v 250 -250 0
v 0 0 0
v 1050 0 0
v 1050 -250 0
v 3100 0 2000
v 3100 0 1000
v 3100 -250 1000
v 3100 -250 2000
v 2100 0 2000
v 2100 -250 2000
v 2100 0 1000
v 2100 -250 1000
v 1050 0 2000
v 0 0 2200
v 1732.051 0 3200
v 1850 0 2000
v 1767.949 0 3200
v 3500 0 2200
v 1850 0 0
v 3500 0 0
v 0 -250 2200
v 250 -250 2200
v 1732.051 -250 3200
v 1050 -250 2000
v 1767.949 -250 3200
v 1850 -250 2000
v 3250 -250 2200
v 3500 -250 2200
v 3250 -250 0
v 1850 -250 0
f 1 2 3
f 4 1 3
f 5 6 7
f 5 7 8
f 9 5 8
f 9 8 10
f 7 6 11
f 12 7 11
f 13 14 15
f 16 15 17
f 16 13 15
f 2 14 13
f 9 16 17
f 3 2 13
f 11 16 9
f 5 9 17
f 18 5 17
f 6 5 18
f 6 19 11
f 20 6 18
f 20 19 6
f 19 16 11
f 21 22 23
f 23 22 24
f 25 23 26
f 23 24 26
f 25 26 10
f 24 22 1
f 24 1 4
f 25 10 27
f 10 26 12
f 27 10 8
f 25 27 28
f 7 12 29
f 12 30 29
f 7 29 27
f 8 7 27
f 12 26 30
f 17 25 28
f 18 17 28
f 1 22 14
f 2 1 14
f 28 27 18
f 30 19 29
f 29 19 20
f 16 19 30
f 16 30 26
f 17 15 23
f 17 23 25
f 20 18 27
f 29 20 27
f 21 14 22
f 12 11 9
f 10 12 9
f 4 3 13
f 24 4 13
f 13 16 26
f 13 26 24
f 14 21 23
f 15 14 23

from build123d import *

# Parameters (mm, degrees)
F0_W      = 3500
F0_H      = 2200
F1_DEPTH  = 250
F3_DEPTH  = 2200.001
F4_W      = 3500
F4_H      = 250
F5_DEPTH  = 1000
F7_DEPTH  = 250.001
F8_W      = 800
F8_H      = 2000
F9_DEPTH  = 250.001
F10_W     = 1000
F10_H     = 1000
F11_DEPTH = 250.001


with BuildPart() as f1:
    # F0 (on Front) → F1 (new body)
    with BuildSketch(Plane.XZ):
        with Locations((1750, 1100)):
            Rectangle(F0_W, F0_H)
    extrude(amount=F1_DEPTH)

    # F2 (on face) → F3 (cut, through all)
    with BuildSketch(Plane.XY.offset(2200)):
        Polygon((250, -250), (0, 0), (0, -250), align=None)
        Polygon((3250, -250), (3500, -250), (3500, 0), align=None)
    extrude(amount=-F3_DEPTH, mode=Mode.SUBTRACT)

    # F4 (on face) → F5 (join)
    with BuildSketch(Plane.XY.offset(2200)):
        with Locations((1750, -125)):
            Rectangle(F4_W, F4_H)
    extrude(amount=F5_DEPTH)

    # F6 (on face) → F7 (cut, through all)
    with BuildSketch(Plane.XZ.offset(250)):
        Polygon((0, 3200), (0, 2200), (1732.050808, 3200), align=None)
        Polygon((3500, 3200), (1767.949192, 3200), (3500, 2200), align=None)
        Polygon((1750, 3210.362971), (1732.050808, 3200), (1767.949192, 3200), align=None)
    extrude(amount=-F7_DEPTH, mode=Mode.SUBTRACT)

    # F8 (on face) → F9 (cut, through all)
    with BuildSketch(Plane(origin=(0, 0, 0), x_dir=(-1, 0, 0), z_dir=(0, 1, 0))):
        with Locations((-1450, 1000)):
            Rectangle(F8_W, F8_H)
    extrude(amount=-F9_DEPTH, mode=Mode.SUBTRACT)

    # F10 (on face) → F11 (cut, through all)
    with BuildSketch(Plane(origin=(0, 0, 0), x_dir=(-1, 0, 0), z_dir=(0, 1, 0))):
        with Locations((-2600, 1500)):
            Rectangle(F10_W, F10_H)
    extrude(amount=-F11_DEPTH, mode=Mode.SUBTRACT)


solid = f1.part
